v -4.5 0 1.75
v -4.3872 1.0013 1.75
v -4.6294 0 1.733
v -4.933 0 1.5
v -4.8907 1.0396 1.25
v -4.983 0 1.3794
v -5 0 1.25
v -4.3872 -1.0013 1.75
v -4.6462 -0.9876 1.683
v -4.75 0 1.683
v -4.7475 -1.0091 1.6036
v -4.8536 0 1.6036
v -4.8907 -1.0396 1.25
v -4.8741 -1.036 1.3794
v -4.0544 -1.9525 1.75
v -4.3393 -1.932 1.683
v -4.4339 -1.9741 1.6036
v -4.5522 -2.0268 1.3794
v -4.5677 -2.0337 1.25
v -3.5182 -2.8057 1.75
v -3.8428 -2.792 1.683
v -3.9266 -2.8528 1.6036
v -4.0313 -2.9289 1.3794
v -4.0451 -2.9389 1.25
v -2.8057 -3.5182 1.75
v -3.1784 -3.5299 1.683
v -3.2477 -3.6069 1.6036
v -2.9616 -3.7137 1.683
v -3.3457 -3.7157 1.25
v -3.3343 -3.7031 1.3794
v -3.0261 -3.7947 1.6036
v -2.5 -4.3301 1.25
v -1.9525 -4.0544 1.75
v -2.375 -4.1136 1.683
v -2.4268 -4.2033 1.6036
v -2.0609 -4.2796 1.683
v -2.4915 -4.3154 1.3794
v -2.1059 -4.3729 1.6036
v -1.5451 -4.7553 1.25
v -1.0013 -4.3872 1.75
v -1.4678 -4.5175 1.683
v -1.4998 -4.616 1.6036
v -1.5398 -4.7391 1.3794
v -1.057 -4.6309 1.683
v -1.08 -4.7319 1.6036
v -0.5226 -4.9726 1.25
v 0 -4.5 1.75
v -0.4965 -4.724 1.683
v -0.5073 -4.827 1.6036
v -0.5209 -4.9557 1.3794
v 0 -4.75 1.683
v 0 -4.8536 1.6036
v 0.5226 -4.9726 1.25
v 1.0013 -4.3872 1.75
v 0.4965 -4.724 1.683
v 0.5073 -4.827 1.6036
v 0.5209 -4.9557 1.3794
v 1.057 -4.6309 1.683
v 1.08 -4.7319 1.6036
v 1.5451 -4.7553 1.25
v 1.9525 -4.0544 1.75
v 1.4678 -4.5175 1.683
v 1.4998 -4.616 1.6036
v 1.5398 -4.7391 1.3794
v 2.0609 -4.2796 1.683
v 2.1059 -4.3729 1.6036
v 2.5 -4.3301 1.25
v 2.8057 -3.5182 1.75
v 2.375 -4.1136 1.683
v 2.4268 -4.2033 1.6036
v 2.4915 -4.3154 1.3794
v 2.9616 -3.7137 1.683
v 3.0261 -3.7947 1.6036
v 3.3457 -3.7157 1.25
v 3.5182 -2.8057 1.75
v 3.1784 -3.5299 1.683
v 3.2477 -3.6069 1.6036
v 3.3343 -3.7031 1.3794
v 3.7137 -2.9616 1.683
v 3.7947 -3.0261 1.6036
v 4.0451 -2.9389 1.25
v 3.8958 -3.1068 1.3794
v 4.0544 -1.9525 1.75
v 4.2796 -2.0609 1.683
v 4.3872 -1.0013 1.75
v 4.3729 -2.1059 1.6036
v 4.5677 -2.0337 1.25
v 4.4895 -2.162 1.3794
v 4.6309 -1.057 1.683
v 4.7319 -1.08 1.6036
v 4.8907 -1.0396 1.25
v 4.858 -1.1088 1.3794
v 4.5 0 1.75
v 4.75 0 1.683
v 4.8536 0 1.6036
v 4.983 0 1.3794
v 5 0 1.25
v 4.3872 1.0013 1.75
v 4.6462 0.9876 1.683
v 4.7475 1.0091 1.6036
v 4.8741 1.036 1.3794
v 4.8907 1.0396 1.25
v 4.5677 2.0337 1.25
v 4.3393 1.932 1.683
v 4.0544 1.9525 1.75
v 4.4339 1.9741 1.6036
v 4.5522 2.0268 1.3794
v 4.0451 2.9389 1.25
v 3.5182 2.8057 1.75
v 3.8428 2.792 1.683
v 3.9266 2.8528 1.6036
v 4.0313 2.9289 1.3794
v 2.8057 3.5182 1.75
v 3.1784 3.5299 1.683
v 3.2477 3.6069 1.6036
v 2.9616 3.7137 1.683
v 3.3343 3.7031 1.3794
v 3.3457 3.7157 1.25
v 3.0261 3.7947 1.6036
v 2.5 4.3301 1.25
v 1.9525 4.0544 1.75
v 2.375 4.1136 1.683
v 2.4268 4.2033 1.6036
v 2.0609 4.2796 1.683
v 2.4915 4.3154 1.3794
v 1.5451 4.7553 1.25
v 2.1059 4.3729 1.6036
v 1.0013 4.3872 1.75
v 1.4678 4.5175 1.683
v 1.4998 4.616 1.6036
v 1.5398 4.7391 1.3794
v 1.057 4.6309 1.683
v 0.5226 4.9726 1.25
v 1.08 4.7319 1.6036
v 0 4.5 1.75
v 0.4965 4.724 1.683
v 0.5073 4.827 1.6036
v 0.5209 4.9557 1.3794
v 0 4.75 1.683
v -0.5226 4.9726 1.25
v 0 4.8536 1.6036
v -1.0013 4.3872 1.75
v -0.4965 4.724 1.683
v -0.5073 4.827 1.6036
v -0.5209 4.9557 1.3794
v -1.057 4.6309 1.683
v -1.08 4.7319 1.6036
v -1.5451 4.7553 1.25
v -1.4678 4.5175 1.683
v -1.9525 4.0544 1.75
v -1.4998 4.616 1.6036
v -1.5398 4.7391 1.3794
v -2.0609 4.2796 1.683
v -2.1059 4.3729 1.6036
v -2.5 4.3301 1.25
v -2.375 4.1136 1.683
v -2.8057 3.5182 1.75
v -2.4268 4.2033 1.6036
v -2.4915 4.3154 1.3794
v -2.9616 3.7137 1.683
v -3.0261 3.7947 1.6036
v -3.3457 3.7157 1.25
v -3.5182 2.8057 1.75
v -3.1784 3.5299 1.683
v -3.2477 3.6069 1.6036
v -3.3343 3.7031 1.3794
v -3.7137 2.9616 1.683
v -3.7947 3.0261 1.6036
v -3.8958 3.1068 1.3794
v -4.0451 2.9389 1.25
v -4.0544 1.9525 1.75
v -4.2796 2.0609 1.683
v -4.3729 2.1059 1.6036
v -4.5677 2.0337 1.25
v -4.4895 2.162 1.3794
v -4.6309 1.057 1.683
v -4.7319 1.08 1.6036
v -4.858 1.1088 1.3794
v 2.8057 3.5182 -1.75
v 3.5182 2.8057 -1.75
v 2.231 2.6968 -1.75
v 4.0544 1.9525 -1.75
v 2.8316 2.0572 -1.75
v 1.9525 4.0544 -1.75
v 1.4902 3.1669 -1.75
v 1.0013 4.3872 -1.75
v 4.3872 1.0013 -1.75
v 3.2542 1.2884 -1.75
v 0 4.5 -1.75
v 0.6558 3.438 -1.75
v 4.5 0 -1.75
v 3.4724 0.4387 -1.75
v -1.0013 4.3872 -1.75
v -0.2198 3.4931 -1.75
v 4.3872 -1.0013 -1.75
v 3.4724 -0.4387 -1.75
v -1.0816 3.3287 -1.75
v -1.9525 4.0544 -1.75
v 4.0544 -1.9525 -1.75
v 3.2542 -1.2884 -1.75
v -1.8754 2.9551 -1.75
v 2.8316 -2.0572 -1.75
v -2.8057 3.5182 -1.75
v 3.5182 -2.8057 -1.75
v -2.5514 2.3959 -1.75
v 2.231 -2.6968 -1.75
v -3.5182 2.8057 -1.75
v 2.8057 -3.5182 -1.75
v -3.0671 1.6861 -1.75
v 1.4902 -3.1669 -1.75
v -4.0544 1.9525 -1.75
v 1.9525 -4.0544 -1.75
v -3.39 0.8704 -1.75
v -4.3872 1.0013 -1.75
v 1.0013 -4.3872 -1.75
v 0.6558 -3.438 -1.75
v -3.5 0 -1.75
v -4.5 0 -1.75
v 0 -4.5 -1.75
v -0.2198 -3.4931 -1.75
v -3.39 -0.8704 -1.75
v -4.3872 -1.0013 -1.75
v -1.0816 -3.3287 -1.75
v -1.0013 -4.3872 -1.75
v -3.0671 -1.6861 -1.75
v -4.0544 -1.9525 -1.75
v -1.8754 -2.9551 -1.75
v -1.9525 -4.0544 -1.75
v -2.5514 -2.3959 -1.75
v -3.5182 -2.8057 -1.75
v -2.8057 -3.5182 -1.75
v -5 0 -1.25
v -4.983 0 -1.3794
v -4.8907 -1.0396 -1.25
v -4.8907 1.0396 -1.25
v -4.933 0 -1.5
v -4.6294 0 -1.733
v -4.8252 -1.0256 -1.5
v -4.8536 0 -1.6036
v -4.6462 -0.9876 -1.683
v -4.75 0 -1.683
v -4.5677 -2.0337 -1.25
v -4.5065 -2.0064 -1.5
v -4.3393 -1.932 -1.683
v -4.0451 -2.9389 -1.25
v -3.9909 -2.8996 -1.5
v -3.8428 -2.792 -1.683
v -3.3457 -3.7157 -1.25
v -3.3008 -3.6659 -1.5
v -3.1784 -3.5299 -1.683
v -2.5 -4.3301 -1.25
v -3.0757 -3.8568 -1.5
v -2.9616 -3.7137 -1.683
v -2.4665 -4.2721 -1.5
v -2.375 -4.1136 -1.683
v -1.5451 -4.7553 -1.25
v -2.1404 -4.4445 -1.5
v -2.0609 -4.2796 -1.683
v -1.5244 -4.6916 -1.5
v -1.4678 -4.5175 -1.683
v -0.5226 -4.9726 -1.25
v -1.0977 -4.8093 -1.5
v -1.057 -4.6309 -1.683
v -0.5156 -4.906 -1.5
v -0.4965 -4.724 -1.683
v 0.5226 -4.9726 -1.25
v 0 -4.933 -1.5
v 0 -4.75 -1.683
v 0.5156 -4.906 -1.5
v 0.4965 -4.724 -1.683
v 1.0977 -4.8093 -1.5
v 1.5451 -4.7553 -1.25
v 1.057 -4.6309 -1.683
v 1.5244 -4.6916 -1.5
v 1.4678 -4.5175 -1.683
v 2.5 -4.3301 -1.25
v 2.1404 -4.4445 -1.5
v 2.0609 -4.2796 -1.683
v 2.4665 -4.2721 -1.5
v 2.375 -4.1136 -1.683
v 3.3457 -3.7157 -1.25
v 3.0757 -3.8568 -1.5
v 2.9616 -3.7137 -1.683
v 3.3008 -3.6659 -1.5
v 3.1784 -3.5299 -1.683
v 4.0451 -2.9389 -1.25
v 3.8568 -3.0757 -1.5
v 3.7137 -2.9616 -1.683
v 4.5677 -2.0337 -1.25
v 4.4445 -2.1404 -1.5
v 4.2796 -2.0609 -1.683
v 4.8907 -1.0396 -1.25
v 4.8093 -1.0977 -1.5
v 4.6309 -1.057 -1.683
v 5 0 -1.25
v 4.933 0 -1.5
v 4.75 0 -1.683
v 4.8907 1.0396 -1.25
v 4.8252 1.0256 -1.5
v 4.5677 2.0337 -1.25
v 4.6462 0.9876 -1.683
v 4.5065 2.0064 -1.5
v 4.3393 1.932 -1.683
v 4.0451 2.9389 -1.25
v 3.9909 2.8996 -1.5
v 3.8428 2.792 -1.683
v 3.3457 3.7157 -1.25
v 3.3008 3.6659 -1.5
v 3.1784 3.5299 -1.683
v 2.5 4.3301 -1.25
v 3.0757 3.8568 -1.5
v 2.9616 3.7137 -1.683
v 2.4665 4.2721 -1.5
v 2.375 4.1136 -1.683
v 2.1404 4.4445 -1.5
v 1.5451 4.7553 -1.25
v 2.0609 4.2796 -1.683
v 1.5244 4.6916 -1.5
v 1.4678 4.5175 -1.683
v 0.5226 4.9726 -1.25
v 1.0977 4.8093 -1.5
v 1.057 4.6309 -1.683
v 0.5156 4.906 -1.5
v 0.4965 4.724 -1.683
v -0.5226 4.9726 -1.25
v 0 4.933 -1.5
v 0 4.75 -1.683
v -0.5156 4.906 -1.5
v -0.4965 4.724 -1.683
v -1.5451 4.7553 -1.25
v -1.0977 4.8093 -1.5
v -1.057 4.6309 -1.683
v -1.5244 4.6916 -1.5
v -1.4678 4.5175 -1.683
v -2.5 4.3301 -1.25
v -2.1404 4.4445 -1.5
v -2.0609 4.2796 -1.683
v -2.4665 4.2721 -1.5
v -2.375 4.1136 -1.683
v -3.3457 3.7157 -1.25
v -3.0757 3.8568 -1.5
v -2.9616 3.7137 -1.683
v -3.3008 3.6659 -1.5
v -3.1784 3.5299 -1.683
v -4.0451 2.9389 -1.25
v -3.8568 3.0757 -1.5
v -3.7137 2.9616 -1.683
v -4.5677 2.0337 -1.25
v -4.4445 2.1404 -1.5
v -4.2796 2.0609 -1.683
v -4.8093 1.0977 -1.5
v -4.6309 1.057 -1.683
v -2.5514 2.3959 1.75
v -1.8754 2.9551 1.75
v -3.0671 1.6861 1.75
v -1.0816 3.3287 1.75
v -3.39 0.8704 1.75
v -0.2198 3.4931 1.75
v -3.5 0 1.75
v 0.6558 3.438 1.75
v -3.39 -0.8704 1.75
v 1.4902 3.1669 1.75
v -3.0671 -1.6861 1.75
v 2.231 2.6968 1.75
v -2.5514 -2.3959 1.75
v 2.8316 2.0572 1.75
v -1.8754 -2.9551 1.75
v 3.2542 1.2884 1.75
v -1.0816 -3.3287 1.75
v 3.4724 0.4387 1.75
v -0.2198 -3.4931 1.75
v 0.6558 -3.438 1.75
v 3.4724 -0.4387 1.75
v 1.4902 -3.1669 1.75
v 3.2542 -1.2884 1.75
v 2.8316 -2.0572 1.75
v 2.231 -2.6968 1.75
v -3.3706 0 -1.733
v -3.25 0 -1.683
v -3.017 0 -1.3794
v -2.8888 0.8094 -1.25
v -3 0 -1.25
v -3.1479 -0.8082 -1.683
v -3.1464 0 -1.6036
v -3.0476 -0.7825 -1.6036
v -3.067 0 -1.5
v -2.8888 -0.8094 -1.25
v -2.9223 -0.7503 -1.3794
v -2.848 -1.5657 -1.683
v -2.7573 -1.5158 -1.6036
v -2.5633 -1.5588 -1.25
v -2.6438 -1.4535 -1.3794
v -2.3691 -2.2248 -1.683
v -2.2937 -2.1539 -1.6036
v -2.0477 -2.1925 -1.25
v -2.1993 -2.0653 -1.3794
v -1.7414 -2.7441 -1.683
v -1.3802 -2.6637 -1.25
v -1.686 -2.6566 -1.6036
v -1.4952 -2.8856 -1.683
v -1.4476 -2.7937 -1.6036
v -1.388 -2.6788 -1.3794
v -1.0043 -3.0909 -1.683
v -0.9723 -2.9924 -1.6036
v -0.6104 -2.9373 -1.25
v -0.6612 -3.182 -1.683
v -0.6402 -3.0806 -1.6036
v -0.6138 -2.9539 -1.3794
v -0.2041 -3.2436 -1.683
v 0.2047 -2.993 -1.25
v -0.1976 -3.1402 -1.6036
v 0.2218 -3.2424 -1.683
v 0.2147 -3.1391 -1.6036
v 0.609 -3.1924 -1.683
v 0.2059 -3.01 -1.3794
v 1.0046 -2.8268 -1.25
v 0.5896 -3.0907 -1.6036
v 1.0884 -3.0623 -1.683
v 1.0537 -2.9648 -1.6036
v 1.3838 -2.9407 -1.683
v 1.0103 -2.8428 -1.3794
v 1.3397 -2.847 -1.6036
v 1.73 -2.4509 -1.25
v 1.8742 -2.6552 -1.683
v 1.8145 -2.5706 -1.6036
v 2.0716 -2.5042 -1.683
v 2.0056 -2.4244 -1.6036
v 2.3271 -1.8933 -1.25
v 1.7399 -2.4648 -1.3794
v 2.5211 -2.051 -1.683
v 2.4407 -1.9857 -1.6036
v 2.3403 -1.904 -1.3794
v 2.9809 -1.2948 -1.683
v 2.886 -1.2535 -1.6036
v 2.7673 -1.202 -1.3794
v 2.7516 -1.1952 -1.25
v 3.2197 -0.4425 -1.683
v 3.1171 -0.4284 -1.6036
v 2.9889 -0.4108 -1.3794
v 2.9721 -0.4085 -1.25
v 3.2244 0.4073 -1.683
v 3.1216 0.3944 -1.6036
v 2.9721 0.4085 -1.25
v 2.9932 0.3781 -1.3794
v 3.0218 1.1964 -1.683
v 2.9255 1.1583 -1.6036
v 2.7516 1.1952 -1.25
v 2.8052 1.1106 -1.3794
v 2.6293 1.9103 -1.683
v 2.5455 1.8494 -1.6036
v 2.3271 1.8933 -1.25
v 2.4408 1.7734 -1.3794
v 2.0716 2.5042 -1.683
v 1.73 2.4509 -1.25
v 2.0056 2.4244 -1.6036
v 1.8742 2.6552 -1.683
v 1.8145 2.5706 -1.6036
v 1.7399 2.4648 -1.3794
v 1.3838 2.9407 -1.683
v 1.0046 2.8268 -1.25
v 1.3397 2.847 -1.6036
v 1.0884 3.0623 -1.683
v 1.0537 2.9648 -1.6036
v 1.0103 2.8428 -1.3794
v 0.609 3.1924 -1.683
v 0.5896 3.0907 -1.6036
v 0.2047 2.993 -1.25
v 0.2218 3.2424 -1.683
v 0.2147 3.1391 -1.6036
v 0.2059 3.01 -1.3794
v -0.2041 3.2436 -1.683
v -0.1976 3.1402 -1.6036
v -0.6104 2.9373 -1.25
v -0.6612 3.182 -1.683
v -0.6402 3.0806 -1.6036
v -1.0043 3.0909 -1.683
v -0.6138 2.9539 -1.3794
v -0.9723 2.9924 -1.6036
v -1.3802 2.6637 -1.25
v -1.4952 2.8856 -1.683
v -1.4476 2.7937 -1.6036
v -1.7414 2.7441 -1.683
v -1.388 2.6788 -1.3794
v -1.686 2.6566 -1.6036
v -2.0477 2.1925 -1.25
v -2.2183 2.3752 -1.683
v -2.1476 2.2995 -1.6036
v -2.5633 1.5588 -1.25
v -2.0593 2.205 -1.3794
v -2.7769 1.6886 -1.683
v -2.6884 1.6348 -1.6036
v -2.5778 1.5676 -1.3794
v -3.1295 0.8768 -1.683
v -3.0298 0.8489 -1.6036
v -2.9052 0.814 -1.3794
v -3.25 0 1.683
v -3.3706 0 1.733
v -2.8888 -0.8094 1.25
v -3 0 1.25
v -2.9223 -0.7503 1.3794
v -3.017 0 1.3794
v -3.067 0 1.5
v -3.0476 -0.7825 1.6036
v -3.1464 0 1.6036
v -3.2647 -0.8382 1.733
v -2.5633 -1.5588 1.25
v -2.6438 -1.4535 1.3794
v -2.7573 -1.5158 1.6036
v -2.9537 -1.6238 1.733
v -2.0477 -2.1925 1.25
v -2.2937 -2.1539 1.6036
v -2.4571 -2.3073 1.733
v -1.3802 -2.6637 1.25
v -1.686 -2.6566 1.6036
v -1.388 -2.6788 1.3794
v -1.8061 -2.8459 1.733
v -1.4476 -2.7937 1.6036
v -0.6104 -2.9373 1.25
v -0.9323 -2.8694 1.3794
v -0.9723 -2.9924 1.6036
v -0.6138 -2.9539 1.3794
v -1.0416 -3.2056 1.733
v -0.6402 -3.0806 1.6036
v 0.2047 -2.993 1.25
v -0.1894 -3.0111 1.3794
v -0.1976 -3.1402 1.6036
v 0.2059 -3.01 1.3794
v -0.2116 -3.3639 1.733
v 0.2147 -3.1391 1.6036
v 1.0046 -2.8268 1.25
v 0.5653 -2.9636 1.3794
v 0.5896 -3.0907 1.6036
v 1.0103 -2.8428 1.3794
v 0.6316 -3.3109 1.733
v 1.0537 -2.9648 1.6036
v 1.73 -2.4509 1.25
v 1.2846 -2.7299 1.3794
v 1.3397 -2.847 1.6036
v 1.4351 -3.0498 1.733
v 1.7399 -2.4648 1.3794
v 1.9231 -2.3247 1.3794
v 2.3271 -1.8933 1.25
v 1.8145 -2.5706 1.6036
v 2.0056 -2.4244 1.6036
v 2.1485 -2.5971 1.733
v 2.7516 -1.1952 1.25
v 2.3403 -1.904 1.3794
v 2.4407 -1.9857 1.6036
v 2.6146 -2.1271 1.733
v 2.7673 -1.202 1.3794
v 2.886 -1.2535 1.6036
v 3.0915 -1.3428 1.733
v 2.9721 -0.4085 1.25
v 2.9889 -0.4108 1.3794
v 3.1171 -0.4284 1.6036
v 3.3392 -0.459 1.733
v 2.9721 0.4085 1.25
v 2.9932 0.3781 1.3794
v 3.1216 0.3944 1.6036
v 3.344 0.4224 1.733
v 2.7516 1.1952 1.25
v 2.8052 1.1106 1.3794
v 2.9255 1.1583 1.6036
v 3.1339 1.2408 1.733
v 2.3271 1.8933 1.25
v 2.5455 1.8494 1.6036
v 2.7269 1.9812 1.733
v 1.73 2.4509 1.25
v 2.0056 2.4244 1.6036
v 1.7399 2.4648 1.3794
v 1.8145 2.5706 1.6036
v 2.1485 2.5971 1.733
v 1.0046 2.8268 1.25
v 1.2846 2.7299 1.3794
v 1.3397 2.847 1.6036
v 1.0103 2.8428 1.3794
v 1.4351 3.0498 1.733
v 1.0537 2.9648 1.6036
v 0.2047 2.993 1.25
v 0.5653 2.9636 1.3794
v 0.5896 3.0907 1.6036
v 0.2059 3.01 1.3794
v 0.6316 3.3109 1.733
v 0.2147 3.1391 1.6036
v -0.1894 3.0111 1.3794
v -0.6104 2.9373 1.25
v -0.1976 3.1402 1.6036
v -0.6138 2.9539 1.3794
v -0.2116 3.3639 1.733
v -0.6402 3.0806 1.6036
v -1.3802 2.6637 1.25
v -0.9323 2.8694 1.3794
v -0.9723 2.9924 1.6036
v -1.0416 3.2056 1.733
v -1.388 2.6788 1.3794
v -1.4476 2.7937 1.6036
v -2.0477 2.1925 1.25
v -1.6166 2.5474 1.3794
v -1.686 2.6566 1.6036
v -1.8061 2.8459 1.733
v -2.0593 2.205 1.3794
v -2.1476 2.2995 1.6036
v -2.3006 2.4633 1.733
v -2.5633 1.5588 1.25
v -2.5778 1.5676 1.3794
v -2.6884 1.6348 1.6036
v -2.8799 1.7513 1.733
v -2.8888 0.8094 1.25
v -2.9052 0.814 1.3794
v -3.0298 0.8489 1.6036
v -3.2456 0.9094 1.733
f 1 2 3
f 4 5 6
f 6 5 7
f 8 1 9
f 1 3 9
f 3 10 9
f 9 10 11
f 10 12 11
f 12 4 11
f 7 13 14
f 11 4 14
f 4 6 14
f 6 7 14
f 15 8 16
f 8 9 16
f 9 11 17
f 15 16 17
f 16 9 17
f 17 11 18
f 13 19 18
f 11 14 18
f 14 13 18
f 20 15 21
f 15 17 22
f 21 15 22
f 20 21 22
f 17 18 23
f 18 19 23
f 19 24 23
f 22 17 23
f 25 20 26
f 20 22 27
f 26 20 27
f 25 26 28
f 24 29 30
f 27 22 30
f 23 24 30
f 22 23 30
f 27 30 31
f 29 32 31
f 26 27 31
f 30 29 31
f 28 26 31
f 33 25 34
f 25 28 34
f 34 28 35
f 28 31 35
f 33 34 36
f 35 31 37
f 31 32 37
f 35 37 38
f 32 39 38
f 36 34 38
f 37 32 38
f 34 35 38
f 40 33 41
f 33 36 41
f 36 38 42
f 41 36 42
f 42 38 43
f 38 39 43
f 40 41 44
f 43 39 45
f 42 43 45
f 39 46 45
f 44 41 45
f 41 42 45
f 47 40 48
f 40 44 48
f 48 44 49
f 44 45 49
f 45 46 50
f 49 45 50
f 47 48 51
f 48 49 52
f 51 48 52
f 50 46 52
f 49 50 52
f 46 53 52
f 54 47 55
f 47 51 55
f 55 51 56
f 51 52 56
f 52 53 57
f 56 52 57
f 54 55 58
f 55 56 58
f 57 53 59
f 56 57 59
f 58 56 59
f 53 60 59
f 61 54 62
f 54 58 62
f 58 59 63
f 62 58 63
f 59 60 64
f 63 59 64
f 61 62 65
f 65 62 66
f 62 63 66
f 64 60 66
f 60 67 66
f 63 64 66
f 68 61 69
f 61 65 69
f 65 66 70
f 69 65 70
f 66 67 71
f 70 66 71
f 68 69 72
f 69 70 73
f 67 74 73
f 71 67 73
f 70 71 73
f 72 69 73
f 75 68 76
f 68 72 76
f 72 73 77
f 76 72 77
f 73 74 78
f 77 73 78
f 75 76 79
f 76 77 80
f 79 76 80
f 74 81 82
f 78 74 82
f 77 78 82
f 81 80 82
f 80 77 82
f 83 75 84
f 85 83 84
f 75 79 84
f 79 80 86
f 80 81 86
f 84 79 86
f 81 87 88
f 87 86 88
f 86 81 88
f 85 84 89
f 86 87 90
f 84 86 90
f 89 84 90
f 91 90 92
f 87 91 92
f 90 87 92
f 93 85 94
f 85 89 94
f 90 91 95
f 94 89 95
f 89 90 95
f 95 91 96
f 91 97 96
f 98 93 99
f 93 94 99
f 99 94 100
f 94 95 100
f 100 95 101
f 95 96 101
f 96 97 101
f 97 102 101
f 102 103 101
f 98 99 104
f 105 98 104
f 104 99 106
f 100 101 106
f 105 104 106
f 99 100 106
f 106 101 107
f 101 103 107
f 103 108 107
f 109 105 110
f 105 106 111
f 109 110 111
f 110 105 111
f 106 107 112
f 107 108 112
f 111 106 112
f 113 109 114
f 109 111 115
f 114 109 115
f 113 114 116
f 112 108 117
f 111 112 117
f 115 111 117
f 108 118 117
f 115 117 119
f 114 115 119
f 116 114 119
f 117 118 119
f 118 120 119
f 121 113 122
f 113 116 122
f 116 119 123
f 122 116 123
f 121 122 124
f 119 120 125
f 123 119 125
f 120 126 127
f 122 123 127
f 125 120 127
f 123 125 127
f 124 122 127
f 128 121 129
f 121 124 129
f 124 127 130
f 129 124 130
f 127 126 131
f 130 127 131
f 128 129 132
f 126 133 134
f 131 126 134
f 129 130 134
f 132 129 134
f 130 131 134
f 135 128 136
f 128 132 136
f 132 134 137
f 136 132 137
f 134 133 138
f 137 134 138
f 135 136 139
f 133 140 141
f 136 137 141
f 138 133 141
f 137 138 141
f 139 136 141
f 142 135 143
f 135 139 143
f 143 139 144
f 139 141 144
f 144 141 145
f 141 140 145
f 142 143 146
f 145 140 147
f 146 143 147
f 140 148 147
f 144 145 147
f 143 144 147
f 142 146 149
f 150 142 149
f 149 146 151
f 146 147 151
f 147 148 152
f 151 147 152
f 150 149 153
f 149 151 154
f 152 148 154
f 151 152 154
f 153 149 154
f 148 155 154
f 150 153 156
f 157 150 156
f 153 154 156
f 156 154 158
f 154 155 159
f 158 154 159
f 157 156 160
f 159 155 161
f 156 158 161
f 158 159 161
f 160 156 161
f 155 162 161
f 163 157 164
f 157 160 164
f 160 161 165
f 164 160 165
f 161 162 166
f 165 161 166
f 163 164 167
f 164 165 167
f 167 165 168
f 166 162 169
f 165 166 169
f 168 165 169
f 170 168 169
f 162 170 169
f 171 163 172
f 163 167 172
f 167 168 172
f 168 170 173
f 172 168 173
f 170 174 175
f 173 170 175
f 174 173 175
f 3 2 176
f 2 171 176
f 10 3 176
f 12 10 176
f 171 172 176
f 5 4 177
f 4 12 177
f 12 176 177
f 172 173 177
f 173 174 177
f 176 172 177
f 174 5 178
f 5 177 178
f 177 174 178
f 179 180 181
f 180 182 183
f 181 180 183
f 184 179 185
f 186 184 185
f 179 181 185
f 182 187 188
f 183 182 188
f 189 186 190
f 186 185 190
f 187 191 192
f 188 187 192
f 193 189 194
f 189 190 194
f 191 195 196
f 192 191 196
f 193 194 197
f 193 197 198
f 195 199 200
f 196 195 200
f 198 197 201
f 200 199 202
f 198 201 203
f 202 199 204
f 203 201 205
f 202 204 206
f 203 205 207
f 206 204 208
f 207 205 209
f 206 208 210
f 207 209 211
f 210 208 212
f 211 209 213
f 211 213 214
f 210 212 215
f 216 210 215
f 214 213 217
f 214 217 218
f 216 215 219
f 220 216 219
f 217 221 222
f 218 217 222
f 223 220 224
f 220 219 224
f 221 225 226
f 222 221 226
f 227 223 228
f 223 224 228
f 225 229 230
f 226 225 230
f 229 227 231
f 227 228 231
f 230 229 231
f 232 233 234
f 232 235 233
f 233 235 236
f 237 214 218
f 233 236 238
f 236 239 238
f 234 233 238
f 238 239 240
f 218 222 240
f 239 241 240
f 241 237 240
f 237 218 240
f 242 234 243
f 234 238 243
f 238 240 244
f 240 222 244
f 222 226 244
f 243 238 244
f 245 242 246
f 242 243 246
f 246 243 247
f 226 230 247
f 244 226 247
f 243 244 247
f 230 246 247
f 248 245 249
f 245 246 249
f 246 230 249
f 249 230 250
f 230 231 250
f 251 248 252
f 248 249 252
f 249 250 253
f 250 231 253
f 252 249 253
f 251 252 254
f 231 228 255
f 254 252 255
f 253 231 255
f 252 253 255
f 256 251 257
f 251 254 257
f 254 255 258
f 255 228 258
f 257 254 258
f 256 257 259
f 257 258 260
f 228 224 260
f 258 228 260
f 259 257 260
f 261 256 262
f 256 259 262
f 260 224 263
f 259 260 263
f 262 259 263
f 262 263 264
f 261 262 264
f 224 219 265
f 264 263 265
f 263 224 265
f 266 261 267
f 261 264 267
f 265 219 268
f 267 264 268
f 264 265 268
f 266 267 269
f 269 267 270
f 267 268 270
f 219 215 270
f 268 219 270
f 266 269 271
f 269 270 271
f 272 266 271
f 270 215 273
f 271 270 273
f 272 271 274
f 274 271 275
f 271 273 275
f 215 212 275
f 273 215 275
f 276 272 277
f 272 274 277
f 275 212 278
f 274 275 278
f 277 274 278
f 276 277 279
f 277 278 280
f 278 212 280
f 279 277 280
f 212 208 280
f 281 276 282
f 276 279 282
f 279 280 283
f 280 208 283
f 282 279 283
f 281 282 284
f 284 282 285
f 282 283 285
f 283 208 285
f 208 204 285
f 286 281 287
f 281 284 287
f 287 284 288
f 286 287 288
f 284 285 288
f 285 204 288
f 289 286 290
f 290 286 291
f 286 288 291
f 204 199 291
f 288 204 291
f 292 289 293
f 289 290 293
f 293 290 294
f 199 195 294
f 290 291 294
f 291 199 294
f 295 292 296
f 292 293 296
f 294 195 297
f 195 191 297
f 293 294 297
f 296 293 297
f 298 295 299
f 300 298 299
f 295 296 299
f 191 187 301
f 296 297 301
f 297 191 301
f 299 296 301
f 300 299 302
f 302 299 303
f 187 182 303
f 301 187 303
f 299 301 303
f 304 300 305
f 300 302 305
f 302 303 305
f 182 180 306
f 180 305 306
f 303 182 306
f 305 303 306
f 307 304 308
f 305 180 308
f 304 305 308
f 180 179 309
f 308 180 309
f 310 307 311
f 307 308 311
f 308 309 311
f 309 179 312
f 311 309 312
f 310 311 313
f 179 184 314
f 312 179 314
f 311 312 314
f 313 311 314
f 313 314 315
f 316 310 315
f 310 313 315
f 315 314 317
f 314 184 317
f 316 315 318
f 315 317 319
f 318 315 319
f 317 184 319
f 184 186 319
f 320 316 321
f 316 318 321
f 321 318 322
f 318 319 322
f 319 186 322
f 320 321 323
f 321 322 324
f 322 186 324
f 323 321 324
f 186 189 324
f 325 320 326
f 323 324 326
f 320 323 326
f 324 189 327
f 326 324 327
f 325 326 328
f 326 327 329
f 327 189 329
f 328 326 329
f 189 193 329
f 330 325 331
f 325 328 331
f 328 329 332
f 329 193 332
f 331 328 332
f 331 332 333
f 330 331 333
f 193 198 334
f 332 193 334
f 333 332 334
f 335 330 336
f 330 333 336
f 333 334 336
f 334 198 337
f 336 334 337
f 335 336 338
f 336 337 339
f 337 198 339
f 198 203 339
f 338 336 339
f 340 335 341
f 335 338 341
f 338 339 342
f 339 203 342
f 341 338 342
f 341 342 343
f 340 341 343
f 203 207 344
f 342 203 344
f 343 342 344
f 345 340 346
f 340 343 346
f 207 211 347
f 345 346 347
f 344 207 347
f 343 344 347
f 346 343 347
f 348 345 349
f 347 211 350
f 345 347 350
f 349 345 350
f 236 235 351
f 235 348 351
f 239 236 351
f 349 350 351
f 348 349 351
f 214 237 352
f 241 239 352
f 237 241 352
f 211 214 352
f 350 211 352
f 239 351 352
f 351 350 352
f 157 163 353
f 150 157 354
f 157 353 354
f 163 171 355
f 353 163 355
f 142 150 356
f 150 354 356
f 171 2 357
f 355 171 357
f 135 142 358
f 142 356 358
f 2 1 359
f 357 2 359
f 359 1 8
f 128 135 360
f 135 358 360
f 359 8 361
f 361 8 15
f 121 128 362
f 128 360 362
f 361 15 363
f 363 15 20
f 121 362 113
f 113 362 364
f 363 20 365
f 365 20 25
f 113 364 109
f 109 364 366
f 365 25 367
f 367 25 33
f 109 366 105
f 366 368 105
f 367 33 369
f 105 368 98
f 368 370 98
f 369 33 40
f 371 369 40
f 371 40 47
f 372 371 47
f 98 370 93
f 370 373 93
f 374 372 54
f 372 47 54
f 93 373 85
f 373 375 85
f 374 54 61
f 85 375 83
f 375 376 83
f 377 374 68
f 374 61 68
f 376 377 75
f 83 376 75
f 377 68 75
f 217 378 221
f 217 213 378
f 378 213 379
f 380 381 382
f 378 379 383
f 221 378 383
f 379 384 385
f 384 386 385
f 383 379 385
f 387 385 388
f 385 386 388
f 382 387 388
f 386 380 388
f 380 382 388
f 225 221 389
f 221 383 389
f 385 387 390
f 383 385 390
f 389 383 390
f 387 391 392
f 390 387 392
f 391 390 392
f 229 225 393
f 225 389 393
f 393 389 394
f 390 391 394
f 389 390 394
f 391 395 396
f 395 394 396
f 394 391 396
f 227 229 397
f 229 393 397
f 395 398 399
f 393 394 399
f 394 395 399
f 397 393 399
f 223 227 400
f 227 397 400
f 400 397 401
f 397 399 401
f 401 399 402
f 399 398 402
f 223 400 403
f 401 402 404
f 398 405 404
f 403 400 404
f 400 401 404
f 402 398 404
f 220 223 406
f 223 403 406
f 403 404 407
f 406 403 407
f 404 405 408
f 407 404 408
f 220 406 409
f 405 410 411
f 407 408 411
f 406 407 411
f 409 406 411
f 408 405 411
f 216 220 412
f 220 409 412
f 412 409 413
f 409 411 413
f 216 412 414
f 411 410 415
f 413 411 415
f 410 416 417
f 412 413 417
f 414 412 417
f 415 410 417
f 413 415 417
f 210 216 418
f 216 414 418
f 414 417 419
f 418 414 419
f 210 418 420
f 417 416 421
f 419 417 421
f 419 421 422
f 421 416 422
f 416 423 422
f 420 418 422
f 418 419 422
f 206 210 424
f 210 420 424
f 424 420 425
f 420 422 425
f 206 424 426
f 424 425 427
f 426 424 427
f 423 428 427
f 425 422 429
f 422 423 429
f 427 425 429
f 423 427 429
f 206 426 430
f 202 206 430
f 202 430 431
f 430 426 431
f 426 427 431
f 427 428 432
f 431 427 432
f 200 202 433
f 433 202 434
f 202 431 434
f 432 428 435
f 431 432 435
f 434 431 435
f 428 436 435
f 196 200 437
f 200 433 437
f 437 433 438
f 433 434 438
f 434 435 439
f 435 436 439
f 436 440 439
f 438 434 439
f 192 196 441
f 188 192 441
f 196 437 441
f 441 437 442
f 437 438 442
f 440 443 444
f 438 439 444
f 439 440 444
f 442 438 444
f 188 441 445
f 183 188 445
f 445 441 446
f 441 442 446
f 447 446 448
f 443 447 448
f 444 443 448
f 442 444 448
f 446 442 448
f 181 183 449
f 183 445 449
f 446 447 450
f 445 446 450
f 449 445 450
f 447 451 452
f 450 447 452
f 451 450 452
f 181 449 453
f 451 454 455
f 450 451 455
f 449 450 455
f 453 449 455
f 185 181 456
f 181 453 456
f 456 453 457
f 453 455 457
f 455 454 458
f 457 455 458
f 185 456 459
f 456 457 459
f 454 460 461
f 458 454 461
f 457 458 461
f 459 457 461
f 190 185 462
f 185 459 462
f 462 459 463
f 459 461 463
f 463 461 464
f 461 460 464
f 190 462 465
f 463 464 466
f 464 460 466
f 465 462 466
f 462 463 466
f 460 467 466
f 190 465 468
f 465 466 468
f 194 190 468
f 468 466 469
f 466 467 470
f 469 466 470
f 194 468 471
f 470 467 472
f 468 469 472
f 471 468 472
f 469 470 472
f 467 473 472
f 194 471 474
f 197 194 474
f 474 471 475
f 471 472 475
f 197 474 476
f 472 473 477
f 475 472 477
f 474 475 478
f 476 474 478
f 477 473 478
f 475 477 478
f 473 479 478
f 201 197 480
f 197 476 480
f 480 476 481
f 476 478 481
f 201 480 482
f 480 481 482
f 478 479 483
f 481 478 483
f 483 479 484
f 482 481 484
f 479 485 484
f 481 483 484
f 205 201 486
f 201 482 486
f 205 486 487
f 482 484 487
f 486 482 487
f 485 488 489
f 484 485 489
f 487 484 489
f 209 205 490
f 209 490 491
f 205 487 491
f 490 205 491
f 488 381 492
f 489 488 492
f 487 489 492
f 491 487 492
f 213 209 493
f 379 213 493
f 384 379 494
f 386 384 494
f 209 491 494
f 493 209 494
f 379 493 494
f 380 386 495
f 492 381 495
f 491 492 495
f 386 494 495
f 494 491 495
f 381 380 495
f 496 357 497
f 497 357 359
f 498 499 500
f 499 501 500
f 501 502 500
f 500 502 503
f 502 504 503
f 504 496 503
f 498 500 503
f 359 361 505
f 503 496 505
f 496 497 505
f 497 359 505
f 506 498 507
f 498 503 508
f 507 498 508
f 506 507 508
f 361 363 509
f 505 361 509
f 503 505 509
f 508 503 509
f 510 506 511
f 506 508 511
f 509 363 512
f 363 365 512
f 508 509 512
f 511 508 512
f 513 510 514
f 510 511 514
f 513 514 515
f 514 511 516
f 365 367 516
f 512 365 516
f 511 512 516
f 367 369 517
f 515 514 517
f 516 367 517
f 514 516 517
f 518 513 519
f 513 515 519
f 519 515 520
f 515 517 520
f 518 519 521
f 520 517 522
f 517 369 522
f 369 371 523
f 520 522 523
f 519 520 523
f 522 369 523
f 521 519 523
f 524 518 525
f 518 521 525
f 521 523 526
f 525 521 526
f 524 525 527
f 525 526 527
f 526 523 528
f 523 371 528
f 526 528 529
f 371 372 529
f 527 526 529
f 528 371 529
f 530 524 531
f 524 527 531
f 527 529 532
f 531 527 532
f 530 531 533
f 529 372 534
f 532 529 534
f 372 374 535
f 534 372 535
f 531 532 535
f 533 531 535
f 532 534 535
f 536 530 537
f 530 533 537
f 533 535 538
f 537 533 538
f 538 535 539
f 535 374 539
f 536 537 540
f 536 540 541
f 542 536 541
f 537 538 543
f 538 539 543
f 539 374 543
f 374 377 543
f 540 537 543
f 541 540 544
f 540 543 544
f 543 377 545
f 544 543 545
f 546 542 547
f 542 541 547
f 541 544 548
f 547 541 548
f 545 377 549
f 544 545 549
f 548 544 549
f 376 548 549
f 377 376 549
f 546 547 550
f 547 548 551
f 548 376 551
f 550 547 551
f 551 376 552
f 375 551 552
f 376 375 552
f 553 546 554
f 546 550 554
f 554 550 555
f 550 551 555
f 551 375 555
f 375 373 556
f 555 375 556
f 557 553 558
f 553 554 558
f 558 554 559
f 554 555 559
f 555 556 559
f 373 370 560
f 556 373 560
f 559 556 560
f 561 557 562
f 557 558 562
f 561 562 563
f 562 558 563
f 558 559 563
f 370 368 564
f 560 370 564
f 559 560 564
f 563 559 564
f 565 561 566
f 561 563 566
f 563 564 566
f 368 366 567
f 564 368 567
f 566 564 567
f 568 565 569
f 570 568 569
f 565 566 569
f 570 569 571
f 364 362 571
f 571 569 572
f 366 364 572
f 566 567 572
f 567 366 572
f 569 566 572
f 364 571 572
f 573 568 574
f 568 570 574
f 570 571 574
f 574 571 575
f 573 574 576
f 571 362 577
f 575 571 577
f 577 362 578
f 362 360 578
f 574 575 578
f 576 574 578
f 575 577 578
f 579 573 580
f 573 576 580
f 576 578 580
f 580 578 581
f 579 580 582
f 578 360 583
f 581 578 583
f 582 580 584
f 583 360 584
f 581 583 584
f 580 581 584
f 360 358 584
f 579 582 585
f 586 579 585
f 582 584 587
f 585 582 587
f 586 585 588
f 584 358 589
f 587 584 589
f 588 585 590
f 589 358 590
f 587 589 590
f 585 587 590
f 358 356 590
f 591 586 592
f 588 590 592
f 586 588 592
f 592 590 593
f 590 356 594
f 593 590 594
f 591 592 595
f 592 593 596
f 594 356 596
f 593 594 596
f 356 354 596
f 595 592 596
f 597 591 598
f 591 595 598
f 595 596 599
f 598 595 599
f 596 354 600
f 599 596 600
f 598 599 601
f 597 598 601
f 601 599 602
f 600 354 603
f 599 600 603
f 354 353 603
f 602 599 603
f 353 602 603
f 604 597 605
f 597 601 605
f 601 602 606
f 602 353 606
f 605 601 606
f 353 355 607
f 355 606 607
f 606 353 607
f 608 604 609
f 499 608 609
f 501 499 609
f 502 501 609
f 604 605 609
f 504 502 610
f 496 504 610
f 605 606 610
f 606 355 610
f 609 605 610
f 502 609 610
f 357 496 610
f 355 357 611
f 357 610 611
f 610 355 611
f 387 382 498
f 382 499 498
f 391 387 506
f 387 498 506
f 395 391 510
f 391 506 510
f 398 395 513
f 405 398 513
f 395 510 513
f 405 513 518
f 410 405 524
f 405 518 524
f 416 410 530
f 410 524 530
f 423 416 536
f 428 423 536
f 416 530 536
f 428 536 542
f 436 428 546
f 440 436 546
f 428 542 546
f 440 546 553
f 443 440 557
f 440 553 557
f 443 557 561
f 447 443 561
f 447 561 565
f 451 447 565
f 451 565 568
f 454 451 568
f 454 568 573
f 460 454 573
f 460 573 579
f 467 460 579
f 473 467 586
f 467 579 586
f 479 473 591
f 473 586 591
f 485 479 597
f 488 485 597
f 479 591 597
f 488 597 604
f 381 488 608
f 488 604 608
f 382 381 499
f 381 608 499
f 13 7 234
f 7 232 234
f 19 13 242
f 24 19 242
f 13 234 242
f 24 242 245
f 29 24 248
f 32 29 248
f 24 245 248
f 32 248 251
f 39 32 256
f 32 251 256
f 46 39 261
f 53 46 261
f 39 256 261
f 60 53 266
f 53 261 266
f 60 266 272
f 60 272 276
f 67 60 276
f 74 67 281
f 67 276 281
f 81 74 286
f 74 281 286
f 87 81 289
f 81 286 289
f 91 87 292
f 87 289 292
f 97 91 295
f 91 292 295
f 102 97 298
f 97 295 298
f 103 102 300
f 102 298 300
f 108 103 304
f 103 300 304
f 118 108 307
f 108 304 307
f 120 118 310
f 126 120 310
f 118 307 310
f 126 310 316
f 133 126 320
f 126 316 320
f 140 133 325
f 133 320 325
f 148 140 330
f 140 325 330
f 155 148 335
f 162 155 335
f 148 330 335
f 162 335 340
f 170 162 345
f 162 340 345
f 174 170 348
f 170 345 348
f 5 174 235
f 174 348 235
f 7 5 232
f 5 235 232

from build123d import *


with BuildPart() as part:
    # Esboço1 → Revolução1 (revolve)
    with BuildSketch(Plane(origin=(0, 0, 0), x_dir=(0, 0, -1), z_dir=(1, 0, 0)), mode=Mode.PRIVATE) as revolu_o1_sk:
        with BuildLine():
            Line((-1.25, 5), (1.25, 5))
            ThreePointArc((1.25, 5), (1.603553391, 4.853553391), (1.75, 4.5))
            Line((1.75, 4.5), (1.75, 3.5))
            ThreePointArc((1.75, 3.5), (1.603553391, 3.146446609), (1.25, 3))
            Line((1.25, 3), (-1.25, 3))
            ThreePointArc((-1.25, 3), (-1.603553391, 3.146446609), (-1.75, 3.5))
            Line((-1.75, 3.5), (-1.75, 4.5))
            ThreePointArc((-1.75, 4.5), (-1.603553391, 4.853553391), (-1.25, 5))
        make_face()
    revolve(revolu_o1_sk.sketch.rotate(Axis((0, 0, 0), (0, 0, 1)), 90), axis=Axis((0, 0, 0), (0, 0, 1)))


solid = part.part
